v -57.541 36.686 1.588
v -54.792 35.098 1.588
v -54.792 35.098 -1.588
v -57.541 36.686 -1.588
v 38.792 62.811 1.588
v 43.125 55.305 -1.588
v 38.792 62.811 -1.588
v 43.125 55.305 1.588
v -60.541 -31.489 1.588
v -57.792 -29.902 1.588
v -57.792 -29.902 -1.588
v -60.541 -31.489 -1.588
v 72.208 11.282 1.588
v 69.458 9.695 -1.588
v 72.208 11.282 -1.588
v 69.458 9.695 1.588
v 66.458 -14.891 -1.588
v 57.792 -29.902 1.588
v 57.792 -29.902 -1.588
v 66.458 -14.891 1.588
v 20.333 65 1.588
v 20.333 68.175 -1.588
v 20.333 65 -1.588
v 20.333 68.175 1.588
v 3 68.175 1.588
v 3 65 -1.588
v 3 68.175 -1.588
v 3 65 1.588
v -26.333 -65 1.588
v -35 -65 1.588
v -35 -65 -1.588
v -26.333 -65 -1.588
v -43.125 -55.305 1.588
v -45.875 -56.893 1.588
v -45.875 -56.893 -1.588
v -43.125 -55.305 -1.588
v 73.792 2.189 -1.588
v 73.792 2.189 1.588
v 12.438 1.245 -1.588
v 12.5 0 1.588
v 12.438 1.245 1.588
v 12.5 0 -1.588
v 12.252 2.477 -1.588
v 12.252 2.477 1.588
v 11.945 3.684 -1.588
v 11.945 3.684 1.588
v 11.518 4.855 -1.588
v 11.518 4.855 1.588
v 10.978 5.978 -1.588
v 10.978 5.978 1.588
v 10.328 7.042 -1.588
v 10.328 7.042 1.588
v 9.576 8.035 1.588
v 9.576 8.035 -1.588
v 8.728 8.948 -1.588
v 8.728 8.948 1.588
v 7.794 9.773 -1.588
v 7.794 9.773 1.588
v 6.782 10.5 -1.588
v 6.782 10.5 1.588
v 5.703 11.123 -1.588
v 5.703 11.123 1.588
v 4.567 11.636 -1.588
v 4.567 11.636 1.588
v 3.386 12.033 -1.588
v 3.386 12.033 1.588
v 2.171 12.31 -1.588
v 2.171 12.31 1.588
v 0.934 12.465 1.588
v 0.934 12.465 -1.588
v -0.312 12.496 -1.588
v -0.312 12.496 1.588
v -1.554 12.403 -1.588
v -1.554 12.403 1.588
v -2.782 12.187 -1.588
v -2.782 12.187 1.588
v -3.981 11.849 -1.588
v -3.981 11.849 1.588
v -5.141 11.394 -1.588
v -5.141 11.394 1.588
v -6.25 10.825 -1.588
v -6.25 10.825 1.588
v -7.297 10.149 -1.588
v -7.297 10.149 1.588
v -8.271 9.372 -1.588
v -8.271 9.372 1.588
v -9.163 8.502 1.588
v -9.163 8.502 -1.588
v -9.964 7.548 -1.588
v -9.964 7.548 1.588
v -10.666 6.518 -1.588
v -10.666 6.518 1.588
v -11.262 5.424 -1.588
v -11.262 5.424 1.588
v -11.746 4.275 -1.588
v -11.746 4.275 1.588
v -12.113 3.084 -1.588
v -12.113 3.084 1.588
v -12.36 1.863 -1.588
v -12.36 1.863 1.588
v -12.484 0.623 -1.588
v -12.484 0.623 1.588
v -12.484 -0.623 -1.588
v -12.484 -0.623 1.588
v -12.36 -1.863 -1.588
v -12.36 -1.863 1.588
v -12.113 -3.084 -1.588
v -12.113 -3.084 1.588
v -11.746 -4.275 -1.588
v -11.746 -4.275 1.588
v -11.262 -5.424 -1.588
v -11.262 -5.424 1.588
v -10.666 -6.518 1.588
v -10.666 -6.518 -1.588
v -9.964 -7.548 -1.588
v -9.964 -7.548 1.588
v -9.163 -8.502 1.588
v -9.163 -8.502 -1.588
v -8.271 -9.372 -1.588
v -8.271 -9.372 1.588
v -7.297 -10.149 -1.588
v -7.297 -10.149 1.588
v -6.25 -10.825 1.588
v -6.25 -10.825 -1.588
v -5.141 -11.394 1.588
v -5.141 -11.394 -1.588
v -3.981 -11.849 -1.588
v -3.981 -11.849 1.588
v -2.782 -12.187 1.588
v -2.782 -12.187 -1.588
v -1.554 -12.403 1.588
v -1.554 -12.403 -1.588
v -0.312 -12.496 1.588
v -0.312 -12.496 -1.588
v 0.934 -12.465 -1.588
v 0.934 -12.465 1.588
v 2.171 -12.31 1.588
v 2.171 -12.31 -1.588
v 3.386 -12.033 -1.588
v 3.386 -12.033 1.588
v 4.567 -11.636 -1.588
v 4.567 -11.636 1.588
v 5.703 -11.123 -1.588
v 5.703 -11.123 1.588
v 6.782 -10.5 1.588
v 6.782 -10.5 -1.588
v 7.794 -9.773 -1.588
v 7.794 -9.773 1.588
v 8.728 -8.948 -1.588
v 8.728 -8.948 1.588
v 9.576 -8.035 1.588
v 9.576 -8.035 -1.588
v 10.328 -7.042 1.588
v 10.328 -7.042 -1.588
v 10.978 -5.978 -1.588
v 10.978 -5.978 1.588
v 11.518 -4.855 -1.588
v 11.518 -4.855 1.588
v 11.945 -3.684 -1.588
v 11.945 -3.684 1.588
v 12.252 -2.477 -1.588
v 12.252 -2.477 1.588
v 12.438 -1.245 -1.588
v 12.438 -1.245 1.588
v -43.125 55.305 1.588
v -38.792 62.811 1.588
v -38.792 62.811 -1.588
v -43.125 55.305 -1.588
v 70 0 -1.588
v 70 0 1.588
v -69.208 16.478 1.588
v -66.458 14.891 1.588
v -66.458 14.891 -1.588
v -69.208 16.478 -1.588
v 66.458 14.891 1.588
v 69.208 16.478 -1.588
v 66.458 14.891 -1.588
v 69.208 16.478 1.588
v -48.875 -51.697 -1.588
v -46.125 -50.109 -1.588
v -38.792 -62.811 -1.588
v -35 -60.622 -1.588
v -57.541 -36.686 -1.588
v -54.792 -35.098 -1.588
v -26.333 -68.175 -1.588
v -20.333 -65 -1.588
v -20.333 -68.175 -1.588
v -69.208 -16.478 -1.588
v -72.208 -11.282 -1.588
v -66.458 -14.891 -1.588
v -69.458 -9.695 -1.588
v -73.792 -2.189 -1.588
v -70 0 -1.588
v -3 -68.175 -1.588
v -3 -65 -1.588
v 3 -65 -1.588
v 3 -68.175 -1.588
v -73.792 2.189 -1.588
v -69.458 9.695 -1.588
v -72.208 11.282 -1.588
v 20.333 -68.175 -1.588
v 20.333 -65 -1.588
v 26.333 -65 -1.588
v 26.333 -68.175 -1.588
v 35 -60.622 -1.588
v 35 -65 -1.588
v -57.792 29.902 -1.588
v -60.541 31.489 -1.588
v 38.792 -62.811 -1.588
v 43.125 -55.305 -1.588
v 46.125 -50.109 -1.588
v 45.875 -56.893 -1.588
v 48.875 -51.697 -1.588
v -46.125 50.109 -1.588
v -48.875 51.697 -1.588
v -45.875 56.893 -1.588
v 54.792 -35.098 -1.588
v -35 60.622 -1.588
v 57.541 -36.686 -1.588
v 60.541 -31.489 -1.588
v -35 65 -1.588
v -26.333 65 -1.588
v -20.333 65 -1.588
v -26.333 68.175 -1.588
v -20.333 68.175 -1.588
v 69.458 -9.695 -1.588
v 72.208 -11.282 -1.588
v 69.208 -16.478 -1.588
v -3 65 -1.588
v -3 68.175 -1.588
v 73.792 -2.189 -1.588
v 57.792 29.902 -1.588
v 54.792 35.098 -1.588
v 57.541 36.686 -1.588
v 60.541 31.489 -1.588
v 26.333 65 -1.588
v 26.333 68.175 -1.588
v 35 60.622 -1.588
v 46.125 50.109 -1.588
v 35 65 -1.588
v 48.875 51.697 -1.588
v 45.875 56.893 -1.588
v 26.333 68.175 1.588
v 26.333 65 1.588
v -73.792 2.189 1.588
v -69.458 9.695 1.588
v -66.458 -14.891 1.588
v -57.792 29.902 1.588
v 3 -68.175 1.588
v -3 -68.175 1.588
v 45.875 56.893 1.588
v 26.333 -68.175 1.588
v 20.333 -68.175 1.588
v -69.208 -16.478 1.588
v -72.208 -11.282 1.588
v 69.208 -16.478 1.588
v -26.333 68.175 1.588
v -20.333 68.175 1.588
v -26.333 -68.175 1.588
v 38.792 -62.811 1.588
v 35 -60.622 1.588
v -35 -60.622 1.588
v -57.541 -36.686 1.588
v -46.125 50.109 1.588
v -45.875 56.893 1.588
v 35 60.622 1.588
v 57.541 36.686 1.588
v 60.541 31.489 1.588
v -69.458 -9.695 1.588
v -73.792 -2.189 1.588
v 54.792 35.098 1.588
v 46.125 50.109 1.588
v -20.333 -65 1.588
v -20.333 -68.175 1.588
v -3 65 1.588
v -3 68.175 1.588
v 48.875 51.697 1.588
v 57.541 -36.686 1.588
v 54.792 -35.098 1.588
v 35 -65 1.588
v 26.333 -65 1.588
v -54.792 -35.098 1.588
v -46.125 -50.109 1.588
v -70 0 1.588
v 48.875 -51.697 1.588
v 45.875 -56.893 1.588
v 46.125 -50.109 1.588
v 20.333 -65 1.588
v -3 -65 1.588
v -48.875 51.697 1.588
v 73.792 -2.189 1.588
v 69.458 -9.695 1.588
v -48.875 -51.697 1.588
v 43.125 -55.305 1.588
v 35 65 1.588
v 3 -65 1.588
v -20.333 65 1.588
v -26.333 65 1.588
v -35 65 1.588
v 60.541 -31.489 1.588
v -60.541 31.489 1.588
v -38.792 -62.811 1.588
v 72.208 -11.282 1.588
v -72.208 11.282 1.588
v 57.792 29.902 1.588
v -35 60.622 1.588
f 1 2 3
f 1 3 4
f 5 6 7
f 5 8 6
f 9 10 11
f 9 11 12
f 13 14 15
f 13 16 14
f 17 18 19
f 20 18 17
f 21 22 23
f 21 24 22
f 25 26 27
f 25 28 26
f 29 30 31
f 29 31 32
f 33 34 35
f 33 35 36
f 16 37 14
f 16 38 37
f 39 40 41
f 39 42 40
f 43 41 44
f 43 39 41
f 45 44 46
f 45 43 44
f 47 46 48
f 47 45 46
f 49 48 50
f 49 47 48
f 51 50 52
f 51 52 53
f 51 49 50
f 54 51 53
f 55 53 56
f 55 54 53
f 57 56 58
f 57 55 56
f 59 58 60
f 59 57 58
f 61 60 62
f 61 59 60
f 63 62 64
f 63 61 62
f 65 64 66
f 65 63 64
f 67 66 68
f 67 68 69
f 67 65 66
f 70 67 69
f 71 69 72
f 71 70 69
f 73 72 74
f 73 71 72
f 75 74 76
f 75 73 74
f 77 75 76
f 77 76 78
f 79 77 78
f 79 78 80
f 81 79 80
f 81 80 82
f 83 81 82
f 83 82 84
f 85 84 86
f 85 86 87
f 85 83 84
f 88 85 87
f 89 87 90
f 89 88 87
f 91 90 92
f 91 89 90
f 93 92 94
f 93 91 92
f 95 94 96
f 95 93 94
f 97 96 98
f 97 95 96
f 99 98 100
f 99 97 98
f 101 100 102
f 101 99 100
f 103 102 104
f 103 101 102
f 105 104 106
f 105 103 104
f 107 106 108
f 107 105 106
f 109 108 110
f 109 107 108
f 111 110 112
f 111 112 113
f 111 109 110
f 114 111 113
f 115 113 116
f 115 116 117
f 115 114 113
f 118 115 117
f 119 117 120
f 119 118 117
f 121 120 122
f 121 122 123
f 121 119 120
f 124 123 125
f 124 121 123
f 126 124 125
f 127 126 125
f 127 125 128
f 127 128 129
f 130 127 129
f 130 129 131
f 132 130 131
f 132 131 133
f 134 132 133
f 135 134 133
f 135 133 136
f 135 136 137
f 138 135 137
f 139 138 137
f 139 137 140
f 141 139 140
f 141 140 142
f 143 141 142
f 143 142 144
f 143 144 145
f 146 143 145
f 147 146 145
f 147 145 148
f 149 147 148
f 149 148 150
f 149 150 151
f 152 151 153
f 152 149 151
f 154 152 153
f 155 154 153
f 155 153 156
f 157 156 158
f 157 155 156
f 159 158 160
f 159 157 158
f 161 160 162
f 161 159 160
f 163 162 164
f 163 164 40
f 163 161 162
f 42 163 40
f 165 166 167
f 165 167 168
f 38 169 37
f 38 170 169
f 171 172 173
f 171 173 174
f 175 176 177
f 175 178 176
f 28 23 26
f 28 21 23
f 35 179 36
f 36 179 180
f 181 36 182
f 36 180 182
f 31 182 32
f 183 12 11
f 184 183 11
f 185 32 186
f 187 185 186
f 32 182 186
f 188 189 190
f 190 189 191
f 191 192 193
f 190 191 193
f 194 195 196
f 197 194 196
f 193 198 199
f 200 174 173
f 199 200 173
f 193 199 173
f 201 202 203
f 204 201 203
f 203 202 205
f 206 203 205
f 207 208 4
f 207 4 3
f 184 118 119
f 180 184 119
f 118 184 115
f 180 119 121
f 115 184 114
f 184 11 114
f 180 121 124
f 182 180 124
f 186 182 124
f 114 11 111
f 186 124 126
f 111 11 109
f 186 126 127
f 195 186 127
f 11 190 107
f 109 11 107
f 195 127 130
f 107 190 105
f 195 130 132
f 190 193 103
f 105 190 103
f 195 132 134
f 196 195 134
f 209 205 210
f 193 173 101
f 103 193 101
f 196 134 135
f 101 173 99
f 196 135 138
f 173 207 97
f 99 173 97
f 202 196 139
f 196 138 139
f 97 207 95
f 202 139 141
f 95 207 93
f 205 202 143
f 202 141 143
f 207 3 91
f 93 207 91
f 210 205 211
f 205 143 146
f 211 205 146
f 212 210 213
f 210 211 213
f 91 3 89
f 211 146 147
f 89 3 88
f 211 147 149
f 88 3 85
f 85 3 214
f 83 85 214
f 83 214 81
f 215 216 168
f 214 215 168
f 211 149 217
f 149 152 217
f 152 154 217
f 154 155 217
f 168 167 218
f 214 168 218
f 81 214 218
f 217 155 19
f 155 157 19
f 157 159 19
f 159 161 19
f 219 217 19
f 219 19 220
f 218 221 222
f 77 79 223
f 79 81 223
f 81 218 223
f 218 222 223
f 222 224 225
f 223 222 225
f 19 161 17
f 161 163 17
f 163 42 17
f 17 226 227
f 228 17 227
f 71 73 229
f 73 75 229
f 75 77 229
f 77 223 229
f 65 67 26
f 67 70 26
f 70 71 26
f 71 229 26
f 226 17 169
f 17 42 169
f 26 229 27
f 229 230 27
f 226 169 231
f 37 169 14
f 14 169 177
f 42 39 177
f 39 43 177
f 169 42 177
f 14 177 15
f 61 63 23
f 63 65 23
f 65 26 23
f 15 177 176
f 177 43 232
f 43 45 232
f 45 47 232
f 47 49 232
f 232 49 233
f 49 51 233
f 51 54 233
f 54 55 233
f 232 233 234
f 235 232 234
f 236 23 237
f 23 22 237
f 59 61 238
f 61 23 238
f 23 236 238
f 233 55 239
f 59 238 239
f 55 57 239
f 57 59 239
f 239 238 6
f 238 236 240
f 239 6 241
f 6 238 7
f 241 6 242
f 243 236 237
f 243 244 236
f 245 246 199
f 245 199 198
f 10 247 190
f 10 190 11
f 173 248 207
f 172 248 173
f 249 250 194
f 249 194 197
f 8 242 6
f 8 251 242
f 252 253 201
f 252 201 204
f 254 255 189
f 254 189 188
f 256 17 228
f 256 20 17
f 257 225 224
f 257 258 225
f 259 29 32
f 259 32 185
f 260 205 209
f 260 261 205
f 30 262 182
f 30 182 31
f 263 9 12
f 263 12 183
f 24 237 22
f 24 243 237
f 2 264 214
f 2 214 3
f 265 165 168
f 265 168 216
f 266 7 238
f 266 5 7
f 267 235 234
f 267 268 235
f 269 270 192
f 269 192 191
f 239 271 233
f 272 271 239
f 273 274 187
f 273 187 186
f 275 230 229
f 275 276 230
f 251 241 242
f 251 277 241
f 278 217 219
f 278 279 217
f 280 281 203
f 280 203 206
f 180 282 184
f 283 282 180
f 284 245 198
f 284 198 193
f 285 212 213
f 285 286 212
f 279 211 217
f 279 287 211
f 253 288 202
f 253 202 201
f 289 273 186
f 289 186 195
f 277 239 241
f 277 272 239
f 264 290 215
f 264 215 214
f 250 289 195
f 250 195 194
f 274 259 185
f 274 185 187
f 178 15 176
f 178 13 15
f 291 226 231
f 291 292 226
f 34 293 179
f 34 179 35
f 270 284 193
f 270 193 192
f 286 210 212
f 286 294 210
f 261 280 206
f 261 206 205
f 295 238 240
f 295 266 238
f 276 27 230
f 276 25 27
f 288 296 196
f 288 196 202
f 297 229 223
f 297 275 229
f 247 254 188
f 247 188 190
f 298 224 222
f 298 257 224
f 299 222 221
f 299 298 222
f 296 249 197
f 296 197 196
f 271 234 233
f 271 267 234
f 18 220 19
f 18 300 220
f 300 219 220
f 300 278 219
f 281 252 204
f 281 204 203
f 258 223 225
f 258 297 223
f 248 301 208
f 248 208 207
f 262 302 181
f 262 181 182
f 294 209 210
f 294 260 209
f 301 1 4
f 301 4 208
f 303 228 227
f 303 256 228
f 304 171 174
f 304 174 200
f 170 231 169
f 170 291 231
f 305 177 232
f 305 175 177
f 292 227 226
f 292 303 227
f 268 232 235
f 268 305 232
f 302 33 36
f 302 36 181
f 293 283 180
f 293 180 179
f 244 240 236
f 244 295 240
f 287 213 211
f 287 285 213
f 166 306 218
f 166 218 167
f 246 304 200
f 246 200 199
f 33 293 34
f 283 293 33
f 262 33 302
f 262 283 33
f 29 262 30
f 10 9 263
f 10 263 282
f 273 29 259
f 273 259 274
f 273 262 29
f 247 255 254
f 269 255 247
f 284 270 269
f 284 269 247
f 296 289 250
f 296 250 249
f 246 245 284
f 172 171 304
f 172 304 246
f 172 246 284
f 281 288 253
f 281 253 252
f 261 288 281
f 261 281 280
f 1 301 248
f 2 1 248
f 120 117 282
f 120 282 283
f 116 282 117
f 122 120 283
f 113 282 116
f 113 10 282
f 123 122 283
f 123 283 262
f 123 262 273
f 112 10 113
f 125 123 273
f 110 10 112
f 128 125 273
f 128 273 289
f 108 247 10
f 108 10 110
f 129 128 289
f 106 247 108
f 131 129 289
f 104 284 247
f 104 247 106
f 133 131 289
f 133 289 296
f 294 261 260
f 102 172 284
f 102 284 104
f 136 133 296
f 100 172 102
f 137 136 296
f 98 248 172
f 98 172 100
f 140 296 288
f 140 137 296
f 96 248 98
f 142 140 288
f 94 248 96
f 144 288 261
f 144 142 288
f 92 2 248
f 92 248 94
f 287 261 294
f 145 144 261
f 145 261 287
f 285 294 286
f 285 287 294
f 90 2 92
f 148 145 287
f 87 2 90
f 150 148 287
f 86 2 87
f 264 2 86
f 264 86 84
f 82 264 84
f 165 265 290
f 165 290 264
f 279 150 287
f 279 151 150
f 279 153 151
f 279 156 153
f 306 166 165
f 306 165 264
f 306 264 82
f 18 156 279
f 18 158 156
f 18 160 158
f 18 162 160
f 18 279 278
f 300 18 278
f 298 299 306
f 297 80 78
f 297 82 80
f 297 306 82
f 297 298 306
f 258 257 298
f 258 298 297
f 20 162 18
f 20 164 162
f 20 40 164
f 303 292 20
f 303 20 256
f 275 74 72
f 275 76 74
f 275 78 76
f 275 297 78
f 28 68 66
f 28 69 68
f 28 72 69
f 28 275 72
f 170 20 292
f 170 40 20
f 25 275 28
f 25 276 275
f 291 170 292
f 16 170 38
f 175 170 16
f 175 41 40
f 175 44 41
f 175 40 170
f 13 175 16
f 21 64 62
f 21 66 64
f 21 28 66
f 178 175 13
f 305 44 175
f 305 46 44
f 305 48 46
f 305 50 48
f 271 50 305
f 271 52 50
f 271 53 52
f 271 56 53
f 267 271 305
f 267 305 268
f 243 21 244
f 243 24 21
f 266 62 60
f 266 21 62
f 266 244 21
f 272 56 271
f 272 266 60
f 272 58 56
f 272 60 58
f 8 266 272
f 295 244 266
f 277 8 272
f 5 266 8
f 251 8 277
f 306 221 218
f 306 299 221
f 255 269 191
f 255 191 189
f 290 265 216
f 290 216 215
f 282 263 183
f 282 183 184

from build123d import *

# Parameters (mm, degrees)
SKETCH2_R           = 12.5
BOSS_EXTRUDE1_DEPTH = 1.5875


with BuildPart() as part:
    # Sketch2 → Boss-Extrude1 (new body, symmetric)
    with BuildSketch(Plane.XY):
        Polygon((-35, 65), (-35, 60.621778265), (-38.791651246, 62.810889132), (-43.124984579, 55.305335633), (-45.874615236, 56.892835633), (-48.874615236, 51.69668321), (-46.124984579, 50.10918321), (-54.791651246, 35.098076211), (-57.541281903, 36.685576211), (-60.541281903, 31.489423789), (-57.791651246, 29.901923789), (-66.458317913, 14.89081679), (-69.20794857, 16.47831679), (-72.20794857, 11.282164367), (-69.458317913, 9.694664367), (-73.791651246, 2.189110868), (-70, 0), (-73.791651246, -2.189110868), (-69.458317913, -9.694664367), (-72.20794857, -11.282164367), (-69.20794857, -16.47831679), (-66.458317913, -14.89081679), (-57.791651246, -29.901923789), (-60.541281903, -31.489423789), (-57.541281903, -36.685576211), (-54.791651246, -35.098076211), (-46.124984579, -50.10918321), (-48.874615236, -51.69668321), (-45.874615236, -56.892835633), (-43.124984579, -55.305335633), (-38.791651246, -62.810889132), (-35, -60.621778265), (-35, -65), (-26.333333333, -65), (-26.333333333, -68.175), (-20.333333333, -68.175), (-20.333333333, -65), (-3, -65), (-3, -68.175), (3, -68.175), (3, -65), (20.333333333, -65), (20.333333333, -68.175), (26.333333333, -68.175), (26.333333333, -65), (35, -65), (35, -60.621778265), (38.791651246, -62.810889132), (43.124984579, -55.305335633), (45.874615236, -56.892835633), (48.874615236, -51.69668321), (46.124984579, -50.10918321), (54.791651246, -35.098076211), (57.541281903, -36.685576211), (60.541281903, -31.489423789), (57.791651246, -29.901923789), (66.458317913, -14.89081679), (69.20794857, -16.47831679), (72.20794857, -11.282164367), (69.458317913, -9.694664367), (73.791651246, -2.189110868), (70, 0), (73.791651246, 2.189110868), (69.458317913, 9.694664367), (72.20794857, 11.282164367), (69.20794857, 16.47831679), (66.458317913, 14.89081679), (57.791651246, 29.901923789), (60.541281903, 31.489423789), (57.541281903, 36.685576211), (54.791651246, 35.098076211), (46.124984579, 50.10918321), (48.874615236, 51.69668321), (45.874615236, 56.892835633), (43.124984579, 55.305335633), (38.791651246, 62.810889132), (35, 60.621778265), (35, 65), (26.333333333, 65), (26.333333333, 68.175), (20.333333333, 68.175), (20.333333333, 65), (3, 65), (3, 68.175), (-3, 68.175), (-3, 65), (-20.333333333, 65), (-20.333333333, 68.175), (-26.333333333, 68.175), (-26.333333333, 65), align=None)
        Circle(SKETCH2_R, mode=Mode.SUBTRACT)
    extrude(amount=BOSS_EXTRUDE1_DEPTH, both=True)


solid = part.part
